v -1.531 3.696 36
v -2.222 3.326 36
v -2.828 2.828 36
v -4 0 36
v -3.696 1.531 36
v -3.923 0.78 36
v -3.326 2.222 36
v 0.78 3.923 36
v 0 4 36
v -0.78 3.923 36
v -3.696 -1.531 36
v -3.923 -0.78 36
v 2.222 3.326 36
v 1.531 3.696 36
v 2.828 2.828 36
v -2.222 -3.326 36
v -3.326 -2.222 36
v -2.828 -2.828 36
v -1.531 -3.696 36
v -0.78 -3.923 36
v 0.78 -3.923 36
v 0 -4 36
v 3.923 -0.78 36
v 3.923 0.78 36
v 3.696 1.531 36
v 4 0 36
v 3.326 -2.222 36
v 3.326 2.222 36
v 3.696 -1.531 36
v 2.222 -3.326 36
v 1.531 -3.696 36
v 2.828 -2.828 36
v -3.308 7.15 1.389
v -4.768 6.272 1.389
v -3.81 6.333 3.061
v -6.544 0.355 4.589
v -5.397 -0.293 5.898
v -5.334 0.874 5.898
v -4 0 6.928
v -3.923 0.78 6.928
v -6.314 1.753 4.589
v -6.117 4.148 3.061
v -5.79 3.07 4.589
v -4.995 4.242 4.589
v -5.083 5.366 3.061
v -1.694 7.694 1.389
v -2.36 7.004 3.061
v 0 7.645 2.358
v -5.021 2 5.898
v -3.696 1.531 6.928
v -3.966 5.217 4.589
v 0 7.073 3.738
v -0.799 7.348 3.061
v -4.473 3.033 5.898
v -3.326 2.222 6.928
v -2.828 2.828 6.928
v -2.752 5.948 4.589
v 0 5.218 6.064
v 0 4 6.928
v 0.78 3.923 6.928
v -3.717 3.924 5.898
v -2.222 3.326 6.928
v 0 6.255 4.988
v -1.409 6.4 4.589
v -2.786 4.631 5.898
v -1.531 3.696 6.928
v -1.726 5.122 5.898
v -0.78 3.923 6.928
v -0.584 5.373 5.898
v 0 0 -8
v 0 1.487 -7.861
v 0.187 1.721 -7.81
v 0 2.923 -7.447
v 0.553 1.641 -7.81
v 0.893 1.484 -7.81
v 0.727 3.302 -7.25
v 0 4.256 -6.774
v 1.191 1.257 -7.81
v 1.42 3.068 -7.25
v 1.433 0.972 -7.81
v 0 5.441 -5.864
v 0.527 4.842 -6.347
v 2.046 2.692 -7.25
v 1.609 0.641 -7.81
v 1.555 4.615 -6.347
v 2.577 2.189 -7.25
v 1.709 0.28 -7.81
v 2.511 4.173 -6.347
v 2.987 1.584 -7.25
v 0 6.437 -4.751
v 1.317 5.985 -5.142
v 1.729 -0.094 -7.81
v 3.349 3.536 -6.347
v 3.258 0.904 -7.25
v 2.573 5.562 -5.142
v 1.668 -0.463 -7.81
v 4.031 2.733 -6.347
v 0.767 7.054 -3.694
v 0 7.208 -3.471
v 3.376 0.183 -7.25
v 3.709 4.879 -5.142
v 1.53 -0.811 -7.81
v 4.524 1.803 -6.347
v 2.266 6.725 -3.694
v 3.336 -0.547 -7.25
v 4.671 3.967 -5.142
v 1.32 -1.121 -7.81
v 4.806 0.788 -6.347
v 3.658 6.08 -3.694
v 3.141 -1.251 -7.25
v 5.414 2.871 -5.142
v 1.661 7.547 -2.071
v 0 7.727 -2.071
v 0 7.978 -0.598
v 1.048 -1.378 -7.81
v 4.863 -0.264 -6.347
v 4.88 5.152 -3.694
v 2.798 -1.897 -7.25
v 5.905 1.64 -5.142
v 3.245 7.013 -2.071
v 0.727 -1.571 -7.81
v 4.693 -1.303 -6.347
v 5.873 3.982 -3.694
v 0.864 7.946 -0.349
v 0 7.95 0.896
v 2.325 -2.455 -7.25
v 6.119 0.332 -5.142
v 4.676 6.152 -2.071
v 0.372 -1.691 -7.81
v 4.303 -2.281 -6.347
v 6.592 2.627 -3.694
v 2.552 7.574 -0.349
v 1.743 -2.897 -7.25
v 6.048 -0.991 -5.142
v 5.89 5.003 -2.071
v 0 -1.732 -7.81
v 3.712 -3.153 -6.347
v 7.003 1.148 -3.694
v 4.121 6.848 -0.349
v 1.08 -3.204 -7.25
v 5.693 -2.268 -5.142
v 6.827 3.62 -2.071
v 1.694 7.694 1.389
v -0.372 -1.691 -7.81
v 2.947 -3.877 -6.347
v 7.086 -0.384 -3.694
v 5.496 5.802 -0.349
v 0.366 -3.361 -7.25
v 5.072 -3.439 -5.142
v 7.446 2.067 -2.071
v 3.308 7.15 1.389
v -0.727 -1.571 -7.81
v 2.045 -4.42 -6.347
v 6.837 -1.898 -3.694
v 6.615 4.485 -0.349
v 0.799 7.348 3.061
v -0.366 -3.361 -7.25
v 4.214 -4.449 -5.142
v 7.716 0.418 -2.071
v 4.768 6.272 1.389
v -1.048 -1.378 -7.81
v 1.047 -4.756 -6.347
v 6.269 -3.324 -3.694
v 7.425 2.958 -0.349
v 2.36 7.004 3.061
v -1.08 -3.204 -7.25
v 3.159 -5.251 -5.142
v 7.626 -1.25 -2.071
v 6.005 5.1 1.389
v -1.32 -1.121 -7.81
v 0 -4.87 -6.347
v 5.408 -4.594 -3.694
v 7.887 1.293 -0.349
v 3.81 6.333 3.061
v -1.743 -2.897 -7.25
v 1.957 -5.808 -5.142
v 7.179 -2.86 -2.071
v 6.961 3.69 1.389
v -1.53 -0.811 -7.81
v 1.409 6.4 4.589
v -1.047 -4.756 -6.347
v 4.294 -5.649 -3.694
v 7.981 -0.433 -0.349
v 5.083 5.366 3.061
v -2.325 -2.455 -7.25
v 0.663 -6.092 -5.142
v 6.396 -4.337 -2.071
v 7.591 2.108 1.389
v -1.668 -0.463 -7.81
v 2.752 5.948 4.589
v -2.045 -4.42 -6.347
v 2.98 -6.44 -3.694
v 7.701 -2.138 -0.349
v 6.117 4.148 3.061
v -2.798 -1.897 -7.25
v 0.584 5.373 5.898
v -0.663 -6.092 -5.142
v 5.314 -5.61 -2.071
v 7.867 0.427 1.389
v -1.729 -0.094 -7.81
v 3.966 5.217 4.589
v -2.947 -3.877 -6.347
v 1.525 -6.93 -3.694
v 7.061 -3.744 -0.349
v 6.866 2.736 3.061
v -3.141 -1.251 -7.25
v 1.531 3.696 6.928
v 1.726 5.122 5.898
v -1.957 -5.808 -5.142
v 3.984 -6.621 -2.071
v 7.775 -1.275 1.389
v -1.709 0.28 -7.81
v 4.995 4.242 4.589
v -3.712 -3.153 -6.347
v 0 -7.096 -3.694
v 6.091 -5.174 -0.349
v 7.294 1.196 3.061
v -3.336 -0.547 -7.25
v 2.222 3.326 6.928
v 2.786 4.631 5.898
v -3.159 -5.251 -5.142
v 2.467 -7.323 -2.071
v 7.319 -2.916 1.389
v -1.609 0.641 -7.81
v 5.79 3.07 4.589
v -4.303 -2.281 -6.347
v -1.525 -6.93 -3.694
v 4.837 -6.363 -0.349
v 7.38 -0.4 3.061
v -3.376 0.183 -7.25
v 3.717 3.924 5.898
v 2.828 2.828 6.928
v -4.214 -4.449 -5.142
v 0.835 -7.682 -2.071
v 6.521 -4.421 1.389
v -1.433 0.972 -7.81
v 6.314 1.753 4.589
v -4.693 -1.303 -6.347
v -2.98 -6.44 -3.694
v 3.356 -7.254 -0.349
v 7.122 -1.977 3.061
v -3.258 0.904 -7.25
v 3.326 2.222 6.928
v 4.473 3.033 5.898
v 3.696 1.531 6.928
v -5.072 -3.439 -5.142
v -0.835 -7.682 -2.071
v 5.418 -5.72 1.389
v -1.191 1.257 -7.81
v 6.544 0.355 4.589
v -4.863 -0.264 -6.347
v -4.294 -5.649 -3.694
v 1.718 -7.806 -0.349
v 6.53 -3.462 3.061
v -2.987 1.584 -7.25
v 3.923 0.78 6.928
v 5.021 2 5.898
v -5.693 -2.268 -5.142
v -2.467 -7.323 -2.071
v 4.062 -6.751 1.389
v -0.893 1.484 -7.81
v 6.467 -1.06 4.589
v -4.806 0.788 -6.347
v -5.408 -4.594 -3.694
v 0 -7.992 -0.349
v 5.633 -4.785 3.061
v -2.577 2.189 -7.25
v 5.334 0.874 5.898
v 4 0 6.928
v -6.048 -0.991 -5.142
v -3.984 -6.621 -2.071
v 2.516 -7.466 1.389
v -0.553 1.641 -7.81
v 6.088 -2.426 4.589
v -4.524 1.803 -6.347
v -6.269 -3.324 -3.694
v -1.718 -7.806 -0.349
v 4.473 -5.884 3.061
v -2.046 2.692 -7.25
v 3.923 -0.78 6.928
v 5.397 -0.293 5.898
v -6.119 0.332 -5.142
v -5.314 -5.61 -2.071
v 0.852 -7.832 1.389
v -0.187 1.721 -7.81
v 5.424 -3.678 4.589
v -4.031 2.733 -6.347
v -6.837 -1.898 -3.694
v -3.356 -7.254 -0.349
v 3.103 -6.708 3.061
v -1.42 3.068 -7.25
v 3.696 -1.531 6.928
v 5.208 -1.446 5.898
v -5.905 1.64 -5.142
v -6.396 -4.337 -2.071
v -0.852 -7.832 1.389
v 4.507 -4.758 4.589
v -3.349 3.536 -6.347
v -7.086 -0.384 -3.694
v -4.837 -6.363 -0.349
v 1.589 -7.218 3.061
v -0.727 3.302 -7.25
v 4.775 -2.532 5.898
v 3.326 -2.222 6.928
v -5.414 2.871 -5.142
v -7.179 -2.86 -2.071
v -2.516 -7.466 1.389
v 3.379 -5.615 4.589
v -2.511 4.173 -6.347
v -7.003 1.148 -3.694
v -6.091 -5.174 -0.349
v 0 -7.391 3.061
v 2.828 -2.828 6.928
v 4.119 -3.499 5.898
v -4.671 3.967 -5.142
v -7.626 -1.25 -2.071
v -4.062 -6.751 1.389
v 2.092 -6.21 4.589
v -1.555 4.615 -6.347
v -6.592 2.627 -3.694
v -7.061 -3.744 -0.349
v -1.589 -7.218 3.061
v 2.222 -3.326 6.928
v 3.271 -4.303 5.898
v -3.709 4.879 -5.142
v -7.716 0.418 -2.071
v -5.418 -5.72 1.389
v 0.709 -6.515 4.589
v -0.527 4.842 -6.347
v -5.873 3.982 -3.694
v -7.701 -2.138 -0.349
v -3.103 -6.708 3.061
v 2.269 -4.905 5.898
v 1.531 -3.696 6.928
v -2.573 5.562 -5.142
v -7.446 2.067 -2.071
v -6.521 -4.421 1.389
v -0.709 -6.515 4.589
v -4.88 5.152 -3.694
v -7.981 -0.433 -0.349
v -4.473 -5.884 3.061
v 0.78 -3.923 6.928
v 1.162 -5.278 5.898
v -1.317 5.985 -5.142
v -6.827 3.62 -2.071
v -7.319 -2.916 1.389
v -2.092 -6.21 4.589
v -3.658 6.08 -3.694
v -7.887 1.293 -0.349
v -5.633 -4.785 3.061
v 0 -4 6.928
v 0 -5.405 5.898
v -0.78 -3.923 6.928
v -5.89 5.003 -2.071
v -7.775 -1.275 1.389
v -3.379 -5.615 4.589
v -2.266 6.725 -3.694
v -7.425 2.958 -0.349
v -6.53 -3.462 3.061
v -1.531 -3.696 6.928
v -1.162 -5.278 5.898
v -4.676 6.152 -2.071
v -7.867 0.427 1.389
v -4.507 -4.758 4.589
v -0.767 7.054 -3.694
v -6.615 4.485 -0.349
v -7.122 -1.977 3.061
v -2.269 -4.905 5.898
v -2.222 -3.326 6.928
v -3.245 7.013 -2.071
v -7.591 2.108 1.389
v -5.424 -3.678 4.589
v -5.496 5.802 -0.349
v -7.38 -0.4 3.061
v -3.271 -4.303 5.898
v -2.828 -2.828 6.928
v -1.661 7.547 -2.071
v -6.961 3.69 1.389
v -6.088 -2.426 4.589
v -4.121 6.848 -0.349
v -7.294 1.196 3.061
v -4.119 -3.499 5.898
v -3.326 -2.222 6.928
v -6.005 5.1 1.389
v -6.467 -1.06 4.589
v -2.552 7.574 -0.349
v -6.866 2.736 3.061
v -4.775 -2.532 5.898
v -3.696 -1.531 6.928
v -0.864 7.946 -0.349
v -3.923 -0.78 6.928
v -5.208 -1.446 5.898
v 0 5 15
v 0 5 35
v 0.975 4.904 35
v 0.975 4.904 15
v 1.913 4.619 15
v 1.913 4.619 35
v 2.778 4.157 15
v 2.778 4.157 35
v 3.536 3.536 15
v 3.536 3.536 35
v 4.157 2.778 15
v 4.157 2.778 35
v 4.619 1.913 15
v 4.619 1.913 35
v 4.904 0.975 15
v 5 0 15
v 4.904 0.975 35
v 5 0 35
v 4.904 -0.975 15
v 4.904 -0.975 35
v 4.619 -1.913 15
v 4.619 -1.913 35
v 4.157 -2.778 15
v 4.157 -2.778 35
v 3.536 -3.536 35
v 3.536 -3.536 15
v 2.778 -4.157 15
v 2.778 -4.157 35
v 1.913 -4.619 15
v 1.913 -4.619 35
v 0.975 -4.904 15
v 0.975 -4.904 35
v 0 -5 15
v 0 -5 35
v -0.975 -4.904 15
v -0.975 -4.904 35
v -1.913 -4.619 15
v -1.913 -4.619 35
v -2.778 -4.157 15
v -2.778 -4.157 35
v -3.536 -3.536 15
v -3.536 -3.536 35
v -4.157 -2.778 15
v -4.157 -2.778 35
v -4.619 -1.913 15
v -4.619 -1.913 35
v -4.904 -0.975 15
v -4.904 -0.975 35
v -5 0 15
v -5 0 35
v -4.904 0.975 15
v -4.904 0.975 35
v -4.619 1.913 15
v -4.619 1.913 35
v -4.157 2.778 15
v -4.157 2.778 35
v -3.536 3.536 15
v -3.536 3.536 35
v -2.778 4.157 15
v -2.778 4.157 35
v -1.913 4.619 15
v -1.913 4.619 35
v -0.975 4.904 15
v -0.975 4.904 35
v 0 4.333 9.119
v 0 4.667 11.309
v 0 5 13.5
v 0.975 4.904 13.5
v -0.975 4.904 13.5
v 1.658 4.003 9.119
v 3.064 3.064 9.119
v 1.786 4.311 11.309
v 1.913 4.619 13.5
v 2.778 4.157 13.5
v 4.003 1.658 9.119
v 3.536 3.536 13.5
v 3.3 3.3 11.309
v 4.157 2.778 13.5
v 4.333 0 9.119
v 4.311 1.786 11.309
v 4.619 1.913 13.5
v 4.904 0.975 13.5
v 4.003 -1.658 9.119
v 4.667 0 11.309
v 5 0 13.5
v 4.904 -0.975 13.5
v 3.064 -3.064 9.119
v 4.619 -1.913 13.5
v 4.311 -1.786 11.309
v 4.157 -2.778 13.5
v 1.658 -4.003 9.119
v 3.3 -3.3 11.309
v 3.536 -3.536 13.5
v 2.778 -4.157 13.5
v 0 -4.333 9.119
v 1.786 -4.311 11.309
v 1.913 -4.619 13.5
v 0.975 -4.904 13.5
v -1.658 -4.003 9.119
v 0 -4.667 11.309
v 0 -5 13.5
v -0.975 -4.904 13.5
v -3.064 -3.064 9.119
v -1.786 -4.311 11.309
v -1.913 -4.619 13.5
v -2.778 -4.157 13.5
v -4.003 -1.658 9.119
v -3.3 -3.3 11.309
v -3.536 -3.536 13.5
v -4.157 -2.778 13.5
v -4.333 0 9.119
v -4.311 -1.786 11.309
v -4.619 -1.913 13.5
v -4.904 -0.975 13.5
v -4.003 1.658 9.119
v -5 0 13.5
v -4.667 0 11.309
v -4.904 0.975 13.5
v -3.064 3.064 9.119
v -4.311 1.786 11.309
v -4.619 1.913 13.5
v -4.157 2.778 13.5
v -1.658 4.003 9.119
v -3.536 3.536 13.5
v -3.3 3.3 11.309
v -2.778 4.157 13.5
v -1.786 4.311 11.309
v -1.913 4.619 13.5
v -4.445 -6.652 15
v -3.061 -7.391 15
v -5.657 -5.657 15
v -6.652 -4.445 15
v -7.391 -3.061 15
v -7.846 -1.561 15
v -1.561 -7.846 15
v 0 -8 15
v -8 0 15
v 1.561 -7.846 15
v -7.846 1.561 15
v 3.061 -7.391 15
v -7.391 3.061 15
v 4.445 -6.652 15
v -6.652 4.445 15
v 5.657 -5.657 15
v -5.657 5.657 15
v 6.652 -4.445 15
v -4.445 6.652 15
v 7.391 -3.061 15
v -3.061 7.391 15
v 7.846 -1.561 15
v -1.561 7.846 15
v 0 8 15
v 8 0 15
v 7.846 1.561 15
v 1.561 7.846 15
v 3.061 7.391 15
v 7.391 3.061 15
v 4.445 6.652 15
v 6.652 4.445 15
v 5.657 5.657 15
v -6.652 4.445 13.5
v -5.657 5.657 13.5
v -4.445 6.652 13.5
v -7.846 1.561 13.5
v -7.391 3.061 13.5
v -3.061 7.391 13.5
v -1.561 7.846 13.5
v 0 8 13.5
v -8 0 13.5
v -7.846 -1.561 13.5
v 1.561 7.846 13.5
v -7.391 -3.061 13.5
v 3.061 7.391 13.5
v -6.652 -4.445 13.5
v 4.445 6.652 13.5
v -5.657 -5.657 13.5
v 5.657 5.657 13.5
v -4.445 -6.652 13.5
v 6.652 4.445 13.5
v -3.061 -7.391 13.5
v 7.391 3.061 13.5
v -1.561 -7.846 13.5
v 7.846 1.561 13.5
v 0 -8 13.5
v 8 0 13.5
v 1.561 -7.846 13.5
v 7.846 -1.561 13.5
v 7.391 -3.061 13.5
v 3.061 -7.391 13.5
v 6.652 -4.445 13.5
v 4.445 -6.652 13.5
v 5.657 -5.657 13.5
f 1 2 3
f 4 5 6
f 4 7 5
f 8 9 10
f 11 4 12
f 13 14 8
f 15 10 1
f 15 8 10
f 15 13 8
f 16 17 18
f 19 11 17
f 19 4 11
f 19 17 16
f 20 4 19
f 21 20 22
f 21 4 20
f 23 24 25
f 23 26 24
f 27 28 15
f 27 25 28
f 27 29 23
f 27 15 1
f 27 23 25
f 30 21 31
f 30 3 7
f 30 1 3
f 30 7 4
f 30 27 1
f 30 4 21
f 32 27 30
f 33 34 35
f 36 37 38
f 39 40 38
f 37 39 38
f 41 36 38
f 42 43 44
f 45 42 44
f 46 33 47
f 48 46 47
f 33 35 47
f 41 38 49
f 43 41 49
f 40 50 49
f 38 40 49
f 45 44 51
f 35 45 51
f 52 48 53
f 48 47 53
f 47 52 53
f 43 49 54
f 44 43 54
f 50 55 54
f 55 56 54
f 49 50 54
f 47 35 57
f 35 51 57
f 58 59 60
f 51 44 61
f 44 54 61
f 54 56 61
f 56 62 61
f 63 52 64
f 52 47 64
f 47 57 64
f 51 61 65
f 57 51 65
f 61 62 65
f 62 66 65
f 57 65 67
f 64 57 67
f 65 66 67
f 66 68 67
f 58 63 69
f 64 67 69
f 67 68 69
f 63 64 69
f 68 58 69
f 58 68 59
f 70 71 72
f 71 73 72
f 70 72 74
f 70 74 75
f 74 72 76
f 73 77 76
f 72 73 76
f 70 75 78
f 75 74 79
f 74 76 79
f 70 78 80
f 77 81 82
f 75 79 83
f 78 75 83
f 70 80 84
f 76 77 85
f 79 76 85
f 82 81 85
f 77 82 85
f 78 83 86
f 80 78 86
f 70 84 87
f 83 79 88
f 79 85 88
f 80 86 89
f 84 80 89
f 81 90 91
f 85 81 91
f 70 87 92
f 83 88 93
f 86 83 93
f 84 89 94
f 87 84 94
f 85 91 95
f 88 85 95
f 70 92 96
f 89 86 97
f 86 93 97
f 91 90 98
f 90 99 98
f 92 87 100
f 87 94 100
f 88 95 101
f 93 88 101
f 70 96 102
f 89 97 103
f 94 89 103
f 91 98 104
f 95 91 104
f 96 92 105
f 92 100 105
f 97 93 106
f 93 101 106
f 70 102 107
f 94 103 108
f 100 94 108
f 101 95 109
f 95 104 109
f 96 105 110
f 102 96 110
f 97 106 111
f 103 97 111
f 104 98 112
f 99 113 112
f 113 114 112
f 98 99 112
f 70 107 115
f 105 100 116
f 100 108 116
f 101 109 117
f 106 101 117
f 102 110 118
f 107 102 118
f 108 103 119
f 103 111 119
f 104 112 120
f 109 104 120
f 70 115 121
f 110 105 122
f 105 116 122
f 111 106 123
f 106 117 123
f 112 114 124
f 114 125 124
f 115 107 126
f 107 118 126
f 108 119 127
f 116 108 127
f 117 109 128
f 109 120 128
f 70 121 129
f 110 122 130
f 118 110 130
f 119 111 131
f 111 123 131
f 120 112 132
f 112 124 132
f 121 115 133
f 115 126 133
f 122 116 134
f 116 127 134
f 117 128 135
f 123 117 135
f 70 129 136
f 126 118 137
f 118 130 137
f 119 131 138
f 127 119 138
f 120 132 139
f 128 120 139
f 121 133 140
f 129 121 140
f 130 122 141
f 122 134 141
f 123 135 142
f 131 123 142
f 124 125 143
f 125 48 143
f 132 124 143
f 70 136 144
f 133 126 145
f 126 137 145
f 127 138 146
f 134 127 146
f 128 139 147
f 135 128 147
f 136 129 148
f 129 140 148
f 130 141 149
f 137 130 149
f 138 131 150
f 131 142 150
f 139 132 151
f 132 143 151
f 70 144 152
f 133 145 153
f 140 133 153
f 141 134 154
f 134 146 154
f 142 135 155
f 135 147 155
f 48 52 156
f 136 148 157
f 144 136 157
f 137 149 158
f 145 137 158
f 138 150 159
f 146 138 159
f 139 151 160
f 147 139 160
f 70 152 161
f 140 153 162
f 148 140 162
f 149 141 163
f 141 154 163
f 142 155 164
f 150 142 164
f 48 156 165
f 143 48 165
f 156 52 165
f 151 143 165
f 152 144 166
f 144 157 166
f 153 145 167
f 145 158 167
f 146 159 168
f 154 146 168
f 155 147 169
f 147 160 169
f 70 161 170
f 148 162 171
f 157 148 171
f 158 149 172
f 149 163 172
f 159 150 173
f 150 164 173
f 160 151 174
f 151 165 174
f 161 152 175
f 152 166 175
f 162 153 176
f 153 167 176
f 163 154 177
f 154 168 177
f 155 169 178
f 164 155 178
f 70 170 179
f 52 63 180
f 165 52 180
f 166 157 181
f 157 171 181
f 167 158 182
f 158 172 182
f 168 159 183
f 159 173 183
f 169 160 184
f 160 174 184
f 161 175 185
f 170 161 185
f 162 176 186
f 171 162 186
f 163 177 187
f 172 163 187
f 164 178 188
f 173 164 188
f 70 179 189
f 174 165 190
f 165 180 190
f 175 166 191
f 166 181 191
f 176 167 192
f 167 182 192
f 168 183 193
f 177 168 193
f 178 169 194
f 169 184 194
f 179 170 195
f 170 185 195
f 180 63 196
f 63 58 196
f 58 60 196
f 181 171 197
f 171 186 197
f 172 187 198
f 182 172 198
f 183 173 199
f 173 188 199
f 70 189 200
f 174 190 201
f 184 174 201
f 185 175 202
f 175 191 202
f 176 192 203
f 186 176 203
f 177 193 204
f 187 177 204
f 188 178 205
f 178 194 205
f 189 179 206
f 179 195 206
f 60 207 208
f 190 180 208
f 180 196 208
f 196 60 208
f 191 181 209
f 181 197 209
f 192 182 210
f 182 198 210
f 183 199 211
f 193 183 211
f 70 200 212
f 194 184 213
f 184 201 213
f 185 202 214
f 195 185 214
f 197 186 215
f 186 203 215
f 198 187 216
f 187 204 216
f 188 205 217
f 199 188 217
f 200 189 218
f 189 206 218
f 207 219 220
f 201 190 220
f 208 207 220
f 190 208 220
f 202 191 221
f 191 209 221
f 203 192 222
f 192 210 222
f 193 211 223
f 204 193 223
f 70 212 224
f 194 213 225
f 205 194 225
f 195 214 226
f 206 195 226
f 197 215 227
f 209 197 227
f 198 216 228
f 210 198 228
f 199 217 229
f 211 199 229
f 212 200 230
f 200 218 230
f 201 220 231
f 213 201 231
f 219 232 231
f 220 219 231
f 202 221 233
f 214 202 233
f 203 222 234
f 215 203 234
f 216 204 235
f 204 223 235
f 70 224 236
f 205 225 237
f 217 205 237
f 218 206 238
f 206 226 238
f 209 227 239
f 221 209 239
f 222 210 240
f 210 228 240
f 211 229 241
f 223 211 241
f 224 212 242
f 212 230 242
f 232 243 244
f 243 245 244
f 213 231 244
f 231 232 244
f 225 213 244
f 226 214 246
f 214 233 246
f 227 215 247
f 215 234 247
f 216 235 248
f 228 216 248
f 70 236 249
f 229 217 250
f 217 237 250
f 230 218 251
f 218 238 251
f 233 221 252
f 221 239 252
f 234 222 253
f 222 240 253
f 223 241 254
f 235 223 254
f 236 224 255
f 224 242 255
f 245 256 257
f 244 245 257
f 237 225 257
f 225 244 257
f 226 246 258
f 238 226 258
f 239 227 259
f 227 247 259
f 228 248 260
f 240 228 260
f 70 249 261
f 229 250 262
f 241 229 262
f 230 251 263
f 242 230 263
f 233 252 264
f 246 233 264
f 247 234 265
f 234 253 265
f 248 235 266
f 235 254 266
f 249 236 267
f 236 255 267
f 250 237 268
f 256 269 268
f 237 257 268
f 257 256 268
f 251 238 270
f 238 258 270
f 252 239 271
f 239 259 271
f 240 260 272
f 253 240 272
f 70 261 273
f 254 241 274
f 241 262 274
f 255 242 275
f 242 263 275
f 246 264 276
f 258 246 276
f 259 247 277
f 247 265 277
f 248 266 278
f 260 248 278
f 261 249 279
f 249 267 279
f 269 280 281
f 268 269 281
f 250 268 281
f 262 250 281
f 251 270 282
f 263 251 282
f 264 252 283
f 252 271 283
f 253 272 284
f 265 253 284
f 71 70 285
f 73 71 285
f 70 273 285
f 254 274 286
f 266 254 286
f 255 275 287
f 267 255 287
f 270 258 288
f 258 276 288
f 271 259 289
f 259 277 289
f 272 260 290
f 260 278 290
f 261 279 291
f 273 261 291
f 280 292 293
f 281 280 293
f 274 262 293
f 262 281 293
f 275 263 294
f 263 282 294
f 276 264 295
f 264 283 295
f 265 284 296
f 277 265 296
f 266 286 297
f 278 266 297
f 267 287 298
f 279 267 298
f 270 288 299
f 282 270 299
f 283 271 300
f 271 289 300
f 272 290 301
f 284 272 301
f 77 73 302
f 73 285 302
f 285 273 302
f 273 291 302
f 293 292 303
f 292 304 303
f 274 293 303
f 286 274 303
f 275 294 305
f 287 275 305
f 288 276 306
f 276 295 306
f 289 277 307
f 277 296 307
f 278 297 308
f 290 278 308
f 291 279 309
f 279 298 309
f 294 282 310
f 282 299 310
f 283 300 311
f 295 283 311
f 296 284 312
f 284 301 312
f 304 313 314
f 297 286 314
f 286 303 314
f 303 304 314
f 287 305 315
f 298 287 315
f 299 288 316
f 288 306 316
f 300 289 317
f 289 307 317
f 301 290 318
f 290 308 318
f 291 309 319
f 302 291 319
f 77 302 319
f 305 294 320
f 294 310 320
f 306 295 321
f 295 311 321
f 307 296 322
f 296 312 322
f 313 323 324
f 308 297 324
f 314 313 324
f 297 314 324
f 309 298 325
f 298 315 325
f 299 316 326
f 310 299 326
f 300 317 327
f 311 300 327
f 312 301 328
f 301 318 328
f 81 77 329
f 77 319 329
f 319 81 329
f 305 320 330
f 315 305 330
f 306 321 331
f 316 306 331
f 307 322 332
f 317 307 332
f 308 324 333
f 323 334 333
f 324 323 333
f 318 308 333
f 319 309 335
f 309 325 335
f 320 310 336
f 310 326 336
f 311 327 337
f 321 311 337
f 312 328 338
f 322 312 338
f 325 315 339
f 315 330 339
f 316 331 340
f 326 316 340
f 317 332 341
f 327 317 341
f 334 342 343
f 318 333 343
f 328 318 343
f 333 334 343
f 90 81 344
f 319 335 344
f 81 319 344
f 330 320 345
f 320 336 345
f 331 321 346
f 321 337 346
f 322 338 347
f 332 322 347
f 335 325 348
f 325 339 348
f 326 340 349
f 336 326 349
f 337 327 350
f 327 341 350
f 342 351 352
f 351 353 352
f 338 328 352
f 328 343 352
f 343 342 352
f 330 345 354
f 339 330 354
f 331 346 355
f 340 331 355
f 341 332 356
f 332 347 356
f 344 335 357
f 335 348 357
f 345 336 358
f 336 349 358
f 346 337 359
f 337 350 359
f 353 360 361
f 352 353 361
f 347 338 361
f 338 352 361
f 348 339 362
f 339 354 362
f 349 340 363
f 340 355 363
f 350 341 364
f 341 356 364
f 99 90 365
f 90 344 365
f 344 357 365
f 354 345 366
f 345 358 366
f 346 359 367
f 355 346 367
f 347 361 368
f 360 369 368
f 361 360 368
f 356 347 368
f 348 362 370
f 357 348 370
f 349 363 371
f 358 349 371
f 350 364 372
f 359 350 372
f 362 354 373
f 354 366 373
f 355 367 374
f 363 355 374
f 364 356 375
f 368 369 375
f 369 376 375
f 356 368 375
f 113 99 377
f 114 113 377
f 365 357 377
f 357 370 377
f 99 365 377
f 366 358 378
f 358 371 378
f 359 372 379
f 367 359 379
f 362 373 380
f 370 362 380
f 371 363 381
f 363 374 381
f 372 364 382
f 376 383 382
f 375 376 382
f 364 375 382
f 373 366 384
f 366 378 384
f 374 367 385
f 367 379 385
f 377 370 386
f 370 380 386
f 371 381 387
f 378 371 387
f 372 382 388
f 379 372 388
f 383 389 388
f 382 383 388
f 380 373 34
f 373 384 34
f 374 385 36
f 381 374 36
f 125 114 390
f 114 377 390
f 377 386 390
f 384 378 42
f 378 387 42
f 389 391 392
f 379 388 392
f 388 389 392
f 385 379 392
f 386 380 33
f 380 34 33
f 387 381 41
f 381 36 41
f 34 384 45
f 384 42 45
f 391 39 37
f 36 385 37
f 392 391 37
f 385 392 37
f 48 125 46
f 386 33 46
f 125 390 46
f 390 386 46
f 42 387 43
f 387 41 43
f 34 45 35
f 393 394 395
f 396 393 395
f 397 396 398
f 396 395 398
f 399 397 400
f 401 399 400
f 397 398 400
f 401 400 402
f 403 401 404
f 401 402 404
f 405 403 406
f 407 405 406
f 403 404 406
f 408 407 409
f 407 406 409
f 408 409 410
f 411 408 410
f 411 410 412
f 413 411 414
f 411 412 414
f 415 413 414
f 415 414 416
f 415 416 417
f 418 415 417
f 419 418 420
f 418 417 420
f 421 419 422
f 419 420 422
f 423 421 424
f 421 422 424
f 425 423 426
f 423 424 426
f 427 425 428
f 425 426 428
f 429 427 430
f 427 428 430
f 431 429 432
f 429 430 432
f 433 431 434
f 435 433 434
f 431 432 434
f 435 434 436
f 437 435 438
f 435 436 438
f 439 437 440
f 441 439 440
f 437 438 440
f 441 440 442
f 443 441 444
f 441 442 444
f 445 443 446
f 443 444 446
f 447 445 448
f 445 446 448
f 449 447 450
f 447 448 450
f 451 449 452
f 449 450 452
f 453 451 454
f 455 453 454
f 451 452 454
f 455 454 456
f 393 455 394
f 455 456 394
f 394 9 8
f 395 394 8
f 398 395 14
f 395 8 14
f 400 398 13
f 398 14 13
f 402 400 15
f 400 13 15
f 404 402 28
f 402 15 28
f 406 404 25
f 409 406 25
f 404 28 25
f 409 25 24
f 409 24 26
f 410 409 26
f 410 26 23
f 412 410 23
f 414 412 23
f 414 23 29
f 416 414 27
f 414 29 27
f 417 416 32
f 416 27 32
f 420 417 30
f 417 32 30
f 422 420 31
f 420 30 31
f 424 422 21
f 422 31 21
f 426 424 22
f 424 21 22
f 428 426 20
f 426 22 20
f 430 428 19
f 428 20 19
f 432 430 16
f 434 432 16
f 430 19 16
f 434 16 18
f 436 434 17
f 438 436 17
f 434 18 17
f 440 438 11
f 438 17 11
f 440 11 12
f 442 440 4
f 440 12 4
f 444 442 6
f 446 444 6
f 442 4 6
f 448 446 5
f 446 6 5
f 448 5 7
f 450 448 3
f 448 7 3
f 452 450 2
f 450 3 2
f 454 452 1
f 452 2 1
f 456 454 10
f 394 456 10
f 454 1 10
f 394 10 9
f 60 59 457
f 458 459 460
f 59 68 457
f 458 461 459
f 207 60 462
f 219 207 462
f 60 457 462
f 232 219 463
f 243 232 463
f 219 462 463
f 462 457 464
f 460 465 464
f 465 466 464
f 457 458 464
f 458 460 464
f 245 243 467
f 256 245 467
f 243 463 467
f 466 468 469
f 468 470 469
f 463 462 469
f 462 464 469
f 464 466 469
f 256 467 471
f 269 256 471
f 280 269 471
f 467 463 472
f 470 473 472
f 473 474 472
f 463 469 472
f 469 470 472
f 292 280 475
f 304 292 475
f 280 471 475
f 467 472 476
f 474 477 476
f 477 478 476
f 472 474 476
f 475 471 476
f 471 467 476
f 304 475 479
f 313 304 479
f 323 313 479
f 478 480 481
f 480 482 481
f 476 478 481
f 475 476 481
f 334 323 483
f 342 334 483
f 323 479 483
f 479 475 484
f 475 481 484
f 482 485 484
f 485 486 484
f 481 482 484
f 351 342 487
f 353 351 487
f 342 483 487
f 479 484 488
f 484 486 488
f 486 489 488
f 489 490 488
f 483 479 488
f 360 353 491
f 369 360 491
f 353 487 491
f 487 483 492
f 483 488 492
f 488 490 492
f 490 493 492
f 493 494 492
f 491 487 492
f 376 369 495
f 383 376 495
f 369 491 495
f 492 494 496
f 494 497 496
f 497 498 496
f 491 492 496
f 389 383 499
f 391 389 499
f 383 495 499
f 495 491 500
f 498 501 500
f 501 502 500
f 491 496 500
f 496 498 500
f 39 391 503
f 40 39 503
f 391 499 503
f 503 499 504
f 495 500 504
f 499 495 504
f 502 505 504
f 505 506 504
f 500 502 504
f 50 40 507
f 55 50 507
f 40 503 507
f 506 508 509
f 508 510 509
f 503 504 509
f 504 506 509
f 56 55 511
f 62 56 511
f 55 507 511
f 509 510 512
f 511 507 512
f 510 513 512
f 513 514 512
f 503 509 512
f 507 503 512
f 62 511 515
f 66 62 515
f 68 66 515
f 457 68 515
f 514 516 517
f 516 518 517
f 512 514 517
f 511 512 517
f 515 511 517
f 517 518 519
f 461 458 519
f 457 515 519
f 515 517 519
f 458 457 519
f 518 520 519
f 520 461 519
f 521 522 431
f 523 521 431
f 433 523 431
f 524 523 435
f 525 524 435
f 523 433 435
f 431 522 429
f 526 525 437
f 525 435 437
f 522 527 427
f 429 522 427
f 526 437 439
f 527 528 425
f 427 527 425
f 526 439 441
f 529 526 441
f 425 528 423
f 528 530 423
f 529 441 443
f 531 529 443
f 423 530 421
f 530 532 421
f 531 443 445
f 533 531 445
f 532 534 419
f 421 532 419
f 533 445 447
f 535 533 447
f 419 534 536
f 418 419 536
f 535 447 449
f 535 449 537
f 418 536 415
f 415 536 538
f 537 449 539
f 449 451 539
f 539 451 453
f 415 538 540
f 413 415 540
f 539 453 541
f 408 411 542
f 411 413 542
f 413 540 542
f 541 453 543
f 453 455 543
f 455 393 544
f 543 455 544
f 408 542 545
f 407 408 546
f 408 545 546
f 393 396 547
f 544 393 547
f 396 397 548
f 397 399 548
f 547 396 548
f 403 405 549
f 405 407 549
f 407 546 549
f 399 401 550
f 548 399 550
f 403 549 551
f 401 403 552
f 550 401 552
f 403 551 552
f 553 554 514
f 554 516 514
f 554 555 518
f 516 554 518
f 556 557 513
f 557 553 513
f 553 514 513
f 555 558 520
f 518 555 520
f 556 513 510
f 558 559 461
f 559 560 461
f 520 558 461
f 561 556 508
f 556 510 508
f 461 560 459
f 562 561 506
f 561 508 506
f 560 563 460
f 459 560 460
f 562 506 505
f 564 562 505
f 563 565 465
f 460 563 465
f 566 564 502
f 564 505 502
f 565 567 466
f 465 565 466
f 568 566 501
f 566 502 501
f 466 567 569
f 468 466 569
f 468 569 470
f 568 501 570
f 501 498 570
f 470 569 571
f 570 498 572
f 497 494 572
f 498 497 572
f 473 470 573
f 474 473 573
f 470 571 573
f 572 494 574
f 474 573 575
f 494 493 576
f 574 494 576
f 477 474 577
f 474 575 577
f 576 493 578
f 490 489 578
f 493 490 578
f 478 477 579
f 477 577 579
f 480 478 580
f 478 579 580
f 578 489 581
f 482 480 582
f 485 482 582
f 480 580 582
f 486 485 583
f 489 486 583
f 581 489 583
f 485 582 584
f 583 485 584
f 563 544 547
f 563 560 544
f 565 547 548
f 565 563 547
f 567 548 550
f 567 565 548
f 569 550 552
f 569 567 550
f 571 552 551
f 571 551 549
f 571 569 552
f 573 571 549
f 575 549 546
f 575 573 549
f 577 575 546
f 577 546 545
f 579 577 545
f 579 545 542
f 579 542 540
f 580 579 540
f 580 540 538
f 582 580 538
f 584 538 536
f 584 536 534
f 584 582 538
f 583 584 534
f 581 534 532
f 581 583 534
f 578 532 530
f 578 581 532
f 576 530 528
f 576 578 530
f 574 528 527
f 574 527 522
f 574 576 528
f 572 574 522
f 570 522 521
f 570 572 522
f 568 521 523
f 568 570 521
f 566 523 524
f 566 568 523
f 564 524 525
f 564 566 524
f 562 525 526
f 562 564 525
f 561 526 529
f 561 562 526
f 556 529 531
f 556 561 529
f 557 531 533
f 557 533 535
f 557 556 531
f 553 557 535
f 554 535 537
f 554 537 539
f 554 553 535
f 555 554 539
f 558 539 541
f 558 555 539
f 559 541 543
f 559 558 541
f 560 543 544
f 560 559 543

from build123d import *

# Parameters (mm, degrees)
CHAMFER1_SIZE = 1


with BuildPart() as part:
    # Sketch1 → Revolve4 (revolve)
    with BuildSketch(Plane(origin=(0, 0, 0), x_dir=(0, 0, -1), z_dir=(1, 0, 0))):
        with BuildLine():
            Line((-36, 0), (8, 0))
            ThreePointArc((8, 0), (2.070552361, 7.72740661), (-6.92820323, 4))
            Line((-6.92820323, 4), (-13.5, 5))
            Line((-13.5, 5), (-13.5, 8))
            Line((-13.5, 8), (-15, 8))
            Line((-15, 8), (-15, 5))
            Line((-15, 5), (-36, 5))
            Line((-36, 5), (-36, 0))
        make_face()
    revolve(axis=Axis((0, 0, -8), (0, 0, -1)))

    # Chamfer1
    chamfer1_edges = [part.edges().sort_by_distance(p)[0] for p in [
        (0, -5, 36),
    ]]
    chamfer(chamfer1_edges, length=CHAMFER1_SIZE)


solid = part.part
